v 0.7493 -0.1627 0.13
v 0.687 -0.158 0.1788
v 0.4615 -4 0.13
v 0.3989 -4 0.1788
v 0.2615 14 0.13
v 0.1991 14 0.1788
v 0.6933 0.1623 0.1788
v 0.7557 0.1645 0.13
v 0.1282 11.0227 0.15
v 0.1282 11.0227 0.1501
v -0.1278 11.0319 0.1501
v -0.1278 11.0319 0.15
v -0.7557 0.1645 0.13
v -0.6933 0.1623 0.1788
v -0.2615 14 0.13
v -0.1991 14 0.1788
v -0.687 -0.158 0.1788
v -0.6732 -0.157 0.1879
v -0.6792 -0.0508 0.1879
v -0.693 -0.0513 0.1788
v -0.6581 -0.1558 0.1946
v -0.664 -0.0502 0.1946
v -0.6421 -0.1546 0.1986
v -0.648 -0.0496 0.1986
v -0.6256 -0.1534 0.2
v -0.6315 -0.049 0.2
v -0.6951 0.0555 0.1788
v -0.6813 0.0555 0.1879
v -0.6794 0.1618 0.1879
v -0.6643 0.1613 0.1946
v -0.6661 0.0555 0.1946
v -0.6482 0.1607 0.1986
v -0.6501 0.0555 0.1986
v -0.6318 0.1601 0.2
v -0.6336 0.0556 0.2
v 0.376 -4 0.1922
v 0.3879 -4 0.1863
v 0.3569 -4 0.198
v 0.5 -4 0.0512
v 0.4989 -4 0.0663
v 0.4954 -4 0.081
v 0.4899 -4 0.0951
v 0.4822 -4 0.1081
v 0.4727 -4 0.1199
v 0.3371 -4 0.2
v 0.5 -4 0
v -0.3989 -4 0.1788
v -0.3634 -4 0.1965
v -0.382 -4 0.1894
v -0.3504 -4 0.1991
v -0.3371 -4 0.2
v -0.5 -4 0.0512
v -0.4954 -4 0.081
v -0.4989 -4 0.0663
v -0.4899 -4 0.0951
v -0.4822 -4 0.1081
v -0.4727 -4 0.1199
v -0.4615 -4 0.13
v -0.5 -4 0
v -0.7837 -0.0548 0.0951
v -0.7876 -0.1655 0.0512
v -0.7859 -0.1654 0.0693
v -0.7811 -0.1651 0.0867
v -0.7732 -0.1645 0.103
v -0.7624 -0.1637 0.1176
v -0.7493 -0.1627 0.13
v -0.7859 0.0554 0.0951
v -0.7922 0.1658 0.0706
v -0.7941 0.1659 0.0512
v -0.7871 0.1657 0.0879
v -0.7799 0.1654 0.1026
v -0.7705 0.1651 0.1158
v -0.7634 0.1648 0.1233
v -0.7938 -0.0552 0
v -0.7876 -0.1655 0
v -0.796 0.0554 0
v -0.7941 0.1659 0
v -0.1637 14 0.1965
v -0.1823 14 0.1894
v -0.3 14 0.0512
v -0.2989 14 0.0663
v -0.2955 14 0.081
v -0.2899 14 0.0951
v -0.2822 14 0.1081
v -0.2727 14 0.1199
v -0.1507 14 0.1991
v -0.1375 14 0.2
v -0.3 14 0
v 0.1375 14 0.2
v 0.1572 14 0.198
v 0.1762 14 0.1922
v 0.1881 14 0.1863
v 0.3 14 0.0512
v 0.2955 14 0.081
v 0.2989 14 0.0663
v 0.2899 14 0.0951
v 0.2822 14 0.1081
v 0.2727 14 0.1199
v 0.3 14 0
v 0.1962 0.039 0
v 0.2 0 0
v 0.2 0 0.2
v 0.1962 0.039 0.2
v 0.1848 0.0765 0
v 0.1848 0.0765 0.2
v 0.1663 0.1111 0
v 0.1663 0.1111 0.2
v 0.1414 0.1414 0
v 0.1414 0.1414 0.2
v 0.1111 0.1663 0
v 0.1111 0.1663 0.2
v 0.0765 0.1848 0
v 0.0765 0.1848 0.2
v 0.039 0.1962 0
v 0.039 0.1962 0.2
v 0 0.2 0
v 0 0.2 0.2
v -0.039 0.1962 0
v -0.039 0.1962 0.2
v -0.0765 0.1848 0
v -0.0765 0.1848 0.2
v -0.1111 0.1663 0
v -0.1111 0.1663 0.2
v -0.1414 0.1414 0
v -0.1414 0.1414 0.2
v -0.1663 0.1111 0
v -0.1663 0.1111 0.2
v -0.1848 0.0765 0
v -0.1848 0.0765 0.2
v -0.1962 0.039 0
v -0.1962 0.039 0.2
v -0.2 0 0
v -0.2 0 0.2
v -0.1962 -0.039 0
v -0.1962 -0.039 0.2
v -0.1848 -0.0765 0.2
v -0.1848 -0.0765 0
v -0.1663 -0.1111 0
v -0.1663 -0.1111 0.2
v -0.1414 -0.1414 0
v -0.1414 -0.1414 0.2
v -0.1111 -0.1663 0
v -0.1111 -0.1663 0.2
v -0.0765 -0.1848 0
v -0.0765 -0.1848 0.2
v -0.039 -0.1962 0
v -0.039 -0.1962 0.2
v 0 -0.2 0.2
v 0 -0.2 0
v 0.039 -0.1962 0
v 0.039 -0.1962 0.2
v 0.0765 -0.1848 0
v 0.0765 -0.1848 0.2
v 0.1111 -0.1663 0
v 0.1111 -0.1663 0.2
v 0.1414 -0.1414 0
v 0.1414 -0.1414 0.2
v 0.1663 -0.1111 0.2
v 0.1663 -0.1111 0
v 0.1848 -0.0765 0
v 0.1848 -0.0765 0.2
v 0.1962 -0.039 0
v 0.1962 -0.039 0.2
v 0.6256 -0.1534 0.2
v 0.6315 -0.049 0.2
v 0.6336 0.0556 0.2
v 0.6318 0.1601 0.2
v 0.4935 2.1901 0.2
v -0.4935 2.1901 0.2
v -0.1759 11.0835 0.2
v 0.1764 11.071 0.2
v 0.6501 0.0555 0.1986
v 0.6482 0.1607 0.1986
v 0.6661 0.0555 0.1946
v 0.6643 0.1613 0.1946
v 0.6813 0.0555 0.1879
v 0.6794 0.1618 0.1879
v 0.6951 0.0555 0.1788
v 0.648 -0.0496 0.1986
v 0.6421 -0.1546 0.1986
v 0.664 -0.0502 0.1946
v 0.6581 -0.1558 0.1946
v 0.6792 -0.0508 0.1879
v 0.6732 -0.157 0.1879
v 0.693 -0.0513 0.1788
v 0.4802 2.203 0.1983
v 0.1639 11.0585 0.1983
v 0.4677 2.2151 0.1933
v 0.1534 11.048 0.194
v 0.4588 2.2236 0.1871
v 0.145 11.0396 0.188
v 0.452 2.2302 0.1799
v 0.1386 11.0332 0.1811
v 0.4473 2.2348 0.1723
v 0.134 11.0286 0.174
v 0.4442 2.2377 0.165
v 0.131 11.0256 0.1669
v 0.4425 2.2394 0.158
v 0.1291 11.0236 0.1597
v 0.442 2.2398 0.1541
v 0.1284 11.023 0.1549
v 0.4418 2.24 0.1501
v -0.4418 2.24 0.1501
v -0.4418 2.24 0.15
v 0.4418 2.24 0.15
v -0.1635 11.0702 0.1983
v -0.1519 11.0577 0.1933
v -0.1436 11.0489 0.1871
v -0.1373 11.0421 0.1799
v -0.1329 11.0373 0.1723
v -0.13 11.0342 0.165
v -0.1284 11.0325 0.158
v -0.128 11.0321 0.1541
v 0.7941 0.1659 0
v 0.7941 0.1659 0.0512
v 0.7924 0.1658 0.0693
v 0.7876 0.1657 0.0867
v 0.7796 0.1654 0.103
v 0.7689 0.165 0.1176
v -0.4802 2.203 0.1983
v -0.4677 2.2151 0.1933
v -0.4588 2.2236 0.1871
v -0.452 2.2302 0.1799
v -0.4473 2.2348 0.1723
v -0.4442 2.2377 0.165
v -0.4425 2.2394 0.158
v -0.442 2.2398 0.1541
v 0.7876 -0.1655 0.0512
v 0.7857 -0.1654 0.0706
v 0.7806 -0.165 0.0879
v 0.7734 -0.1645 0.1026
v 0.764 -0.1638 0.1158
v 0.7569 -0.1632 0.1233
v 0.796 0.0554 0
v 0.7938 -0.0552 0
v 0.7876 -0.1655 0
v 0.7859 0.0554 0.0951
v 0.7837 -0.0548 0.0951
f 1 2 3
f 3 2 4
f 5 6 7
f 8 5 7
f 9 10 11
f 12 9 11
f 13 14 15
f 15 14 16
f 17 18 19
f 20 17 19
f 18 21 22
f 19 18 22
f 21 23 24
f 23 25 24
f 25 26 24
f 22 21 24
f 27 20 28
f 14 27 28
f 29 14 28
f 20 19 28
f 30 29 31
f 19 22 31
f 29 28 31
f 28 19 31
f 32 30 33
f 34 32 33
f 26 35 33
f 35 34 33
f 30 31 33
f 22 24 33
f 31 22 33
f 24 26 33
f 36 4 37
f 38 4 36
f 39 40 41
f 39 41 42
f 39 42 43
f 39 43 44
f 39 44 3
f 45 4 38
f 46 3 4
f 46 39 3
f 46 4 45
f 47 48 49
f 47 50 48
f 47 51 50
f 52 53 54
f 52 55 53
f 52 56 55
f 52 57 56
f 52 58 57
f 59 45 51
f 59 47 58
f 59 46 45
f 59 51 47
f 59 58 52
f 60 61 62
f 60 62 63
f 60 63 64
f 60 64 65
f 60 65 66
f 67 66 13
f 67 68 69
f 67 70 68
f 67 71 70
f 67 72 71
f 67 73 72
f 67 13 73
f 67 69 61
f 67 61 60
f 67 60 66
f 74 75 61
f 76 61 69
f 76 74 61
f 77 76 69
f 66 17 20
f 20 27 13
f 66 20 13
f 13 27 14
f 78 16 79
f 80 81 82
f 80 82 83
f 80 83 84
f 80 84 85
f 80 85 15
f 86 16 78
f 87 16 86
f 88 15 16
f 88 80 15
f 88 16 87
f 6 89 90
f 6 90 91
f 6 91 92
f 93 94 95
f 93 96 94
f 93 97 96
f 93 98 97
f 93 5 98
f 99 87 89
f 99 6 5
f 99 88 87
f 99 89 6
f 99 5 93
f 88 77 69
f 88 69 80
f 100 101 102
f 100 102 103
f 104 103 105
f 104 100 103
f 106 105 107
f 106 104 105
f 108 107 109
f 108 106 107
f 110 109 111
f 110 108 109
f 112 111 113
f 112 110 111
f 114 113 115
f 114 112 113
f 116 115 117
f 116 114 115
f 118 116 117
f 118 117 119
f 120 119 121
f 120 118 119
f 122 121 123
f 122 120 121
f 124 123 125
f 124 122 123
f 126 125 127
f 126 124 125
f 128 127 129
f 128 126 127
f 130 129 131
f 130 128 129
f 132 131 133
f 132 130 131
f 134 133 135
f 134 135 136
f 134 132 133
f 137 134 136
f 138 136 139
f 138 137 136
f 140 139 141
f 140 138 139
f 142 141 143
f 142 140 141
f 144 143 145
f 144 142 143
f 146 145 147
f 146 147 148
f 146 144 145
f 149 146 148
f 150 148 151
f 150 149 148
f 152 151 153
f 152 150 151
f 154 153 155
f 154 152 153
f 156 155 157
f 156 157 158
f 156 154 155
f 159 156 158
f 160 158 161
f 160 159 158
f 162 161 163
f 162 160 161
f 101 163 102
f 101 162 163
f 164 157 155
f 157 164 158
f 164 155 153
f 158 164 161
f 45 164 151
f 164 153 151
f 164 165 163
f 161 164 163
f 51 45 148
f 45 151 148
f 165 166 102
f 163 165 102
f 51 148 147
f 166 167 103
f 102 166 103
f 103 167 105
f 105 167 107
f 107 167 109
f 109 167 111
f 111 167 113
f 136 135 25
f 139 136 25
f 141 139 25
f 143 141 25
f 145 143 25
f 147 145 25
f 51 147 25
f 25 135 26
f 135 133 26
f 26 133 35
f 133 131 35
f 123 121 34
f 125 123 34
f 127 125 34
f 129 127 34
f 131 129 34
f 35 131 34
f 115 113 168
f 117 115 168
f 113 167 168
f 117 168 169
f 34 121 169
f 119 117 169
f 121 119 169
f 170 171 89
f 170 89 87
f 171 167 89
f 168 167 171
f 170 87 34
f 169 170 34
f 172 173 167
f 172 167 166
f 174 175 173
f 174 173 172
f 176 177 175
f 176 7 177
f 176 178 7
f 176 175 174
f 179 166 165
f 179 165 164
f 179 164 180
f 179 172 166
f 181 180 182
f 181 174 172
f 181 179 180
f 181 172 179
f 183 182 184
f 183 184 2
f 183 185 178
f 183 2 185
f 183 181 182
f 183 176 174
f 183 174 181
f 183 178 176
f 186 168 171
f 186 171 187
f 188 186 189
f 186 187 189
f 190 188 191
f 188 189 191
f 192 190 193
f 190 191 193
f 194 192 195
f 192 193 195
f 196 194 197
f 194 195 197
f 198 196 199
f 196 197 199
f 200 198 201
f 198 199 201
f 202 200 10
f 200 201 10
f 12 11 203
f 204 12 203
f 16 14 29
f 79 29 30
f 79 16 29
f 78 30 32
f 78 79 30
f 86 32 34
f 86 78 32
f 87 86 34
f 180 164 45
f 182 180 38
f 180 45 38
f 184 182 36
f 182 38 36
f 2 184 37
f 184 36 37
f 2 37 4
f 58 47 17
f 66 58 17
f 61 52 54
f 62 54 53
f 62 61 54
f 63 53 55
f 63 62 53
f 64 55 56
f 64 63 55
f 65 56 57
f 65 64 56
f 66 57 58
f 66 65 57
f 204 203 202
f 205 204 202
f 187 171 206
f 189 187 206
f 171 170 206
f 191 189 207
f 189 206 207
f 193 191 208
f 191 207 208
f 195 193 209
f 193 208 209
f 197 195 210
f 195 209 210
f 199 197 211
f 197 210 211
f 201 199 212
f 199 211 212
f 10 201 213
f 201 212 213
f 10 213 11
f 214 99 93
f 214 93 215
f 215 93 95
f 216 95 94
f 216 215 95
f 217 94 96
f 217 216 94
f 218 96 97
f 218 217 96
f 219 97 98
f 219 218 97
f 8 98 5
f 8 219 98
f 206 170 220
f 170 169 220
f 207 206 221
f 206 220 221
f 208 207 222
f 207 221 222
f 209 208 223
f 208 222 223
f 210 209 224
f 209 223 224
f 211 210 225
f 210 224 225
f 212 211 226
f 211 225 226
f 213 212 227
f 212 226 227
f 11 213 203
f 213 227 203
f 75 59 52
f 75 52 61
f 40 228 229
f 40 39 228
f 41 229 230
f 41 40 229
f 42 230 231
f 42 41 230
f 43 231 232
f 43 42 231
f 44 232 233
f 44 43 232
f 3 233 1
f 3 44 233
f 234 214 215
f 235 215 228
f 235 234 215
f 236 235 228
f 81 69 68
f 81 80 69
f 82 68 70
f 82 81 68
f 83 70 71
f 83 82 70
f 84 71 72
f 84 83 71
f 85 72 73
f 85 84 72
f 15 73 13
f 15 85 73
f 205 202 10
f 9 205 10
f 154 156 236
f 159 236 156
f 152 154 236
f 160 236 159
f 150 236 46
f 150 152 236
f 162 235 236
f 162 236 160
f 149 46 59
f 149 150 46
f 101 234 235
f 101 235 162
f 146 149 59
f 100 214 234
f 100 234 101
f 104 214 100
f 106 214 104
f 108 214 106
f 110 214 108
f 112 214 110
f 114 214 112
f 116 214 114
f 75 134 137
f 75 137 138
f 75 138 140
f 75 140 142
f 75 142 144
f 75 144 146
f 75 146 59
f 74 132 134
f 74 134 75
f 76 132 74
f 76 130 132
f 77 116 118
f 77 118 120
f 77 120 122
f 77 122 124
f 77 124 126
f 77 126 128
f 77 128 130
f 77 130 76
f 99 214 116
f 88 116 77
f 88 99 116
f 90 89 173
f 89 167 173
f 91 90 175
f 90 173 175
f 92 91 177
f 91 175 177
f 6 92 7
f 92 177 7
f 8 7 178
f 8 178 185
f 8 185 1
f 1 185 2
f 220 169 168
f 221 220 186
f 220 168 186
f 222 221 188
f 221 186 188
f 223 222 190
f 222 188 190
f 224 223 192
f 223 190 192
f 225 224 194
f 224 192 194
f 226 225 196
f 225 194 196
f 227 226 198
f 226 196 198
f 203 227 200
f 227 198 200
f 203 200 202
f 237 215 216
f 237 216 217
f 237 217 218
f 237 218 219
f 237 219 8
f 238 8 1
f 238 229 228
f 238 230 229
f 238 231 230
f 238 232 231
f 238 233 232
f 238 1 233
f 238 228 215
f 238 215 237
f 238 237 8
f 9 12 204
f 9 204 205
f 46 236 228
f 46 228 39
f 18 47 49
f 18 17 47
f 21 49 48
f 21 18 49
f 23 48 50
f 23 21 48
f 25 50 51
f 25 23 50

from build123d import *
from OCP.BRepFilletAPI import BRepFilletAPI_MakeChamfer

# Parameters (mm, degrees)
SKETCH_1_R          = 0.2
EXTRUDE_1_DEPTH     = 0.2
CHAMFER_1_SIZE      = 0.1
CHAMFER_1_SIZE2     = 0.127994163
CUT_EXTRUDE_1_DEPTH = 0.05
FILLET_1_R          = 0.1
FILLET_2_R          = 0.05


with BuildPart() as part:
    # Эскиз1 → Бобышка-Вытянуть1 (new body)
    with BuildSketch(Plane.XY):
        with BuildLine():
            Line((-0.794074936, 0.165901801), (-0.3, 14))
            Line((-0.3, 14), (0.3, 14))
            Line((0.3, 14), (0.794074936, 0.165901801))
            ThreePointArc((0.794074936, 0.165901801), (0.795411305, 8.986e-05), (0.787584302, -0.165542636))
            Line((0.787584302, -0.165542636), (0.5, -4))
            Line((0.5, -4), (-0.5, -4))
            Line((-0.5, -4), (-0.787584302, -0.165542636))
            ThreePointArc((-0.787584302, -0.165542636), (-0.795411305, 8.986e-05), (-0.794074936, 0.165901801))
        make_face()
        Circle(SKETCH_1_R, mode=Mode.SUBTRACT)
    extrude(amount=EXTRUDE_1_DEPTH)

    # Фаска1: one chamfer whose edges measure the first distance from different faces: ONE call of the kernel's chamfer builder (chamfer() names one face for all edges)
    chamfer_1_edges_1 = [part.edges().sort_by_distance(p)[0] for p in [
        (-0.795411305, 8.986e-05, 0.2),
    ]]
    chamfer_1_side_1 = [part.faces().sort_by_distance(p)[0] for p in [
        (-0.795411305, 8.986e-05, 0.1),
    ]]
    chamfer_1_edges_2 = [part.edges().sort_by_distance(p)[0] for p in [
        (-0.643792151, -2.082771318, 0.2),
    ]]
    chamfer_1_side_2 = [part.faces().sort_by_distance(p)[0] for p in [
        (-0.643792151, -2.082771318, 0.1),
    ]]
    chamfer_1_edges_3 = [part.edges().sort_by_distance(p)[0] for p in [
        (0.643792151, -2.082771318, 0.2),
    ]]
    chamfer_1_side_3 = [part.faces().sort_by_distance(p)[0] for p in [
        (0.643792151, -2.082771318, 0.1),
    ]]
    chamfer_1_edges_4 = [part.edges().sort_by_distance(p)[0] for p in [
        (0.795411305, 8.986e-05, 0.2),
    ]]
    chamfer_1_side_4 = [part.faces().sort_by_distance(p)[0] for p in [
        (0.795411305, 8.986e-05, 0.1),
    ]]
    chamfer_1_edges_5 = [part.edges().sort_by_distance(p)[0] for p in [
        (0.547037468, 7.0829509, 0.2),
    ]]
    chamfer_1_side_5 = [part.faces().sort_by_distance(p)[0] for p in [
        (0.547037468, 7.0829509, 0.1),
    ]]
    chamfer_1_edges_6 = [part.edges().sort_by_distance(p)[0] for p in [
        (-0.547037468, 7.0829509, 0.2),
    ]]
    chamfer_1_side_6 = [part.faces().sort_by_distance(p)[0] for p in [
        (-0.547037468, 7.0829509, 0.1),
    ]]
    chamfer_1 = BRepFilletAPI_MakeChamfer(part.part.solid().wrapped)
    for e in chamfer_1_edges_1:
        chamfer_1.Add(CHAMFER_1_SIZE, CHAMFER_1_SIZE2, e.wrapped, chamfer_1_side_1[0].wrapped)  # the first distance lies on this face
    for e in chamfer_1_edges_2:
        chamfer_1.Add(CHAMFER_1_SIZE, CHAMFER_1_SIZE2, e.wrapped, chamfer_1_side_2[0].wrapped)  # the first distance lies on this face
    for e in chamfer_1_edges_3:
        chamfer_1.Add(CHAMFER_1_SIZE, CHAMFER_1_SIZE2, e.wrapped, chamfer_1_side_3[0].wrapped)  # the first distance lies on this face
    for e in chamfer_1_edges_4:
        chamfer_1.Add(CHAMFER_1_SIZE, CHAMFER_1_SIZE2, e.wrapped, chamfer_1_side_4[0].wrapped)  # the first distance lies on this face
    for e in chamfer_1_edges_5:
        chamfer_1.Add(CHAMFER_1_SIZE, CHAMFER_1_SIZE2, e.wrapped, chamfer_1_side_5[0].wrapped)  # the first distance lies on this face
    for e in chamfer_1_edges_6:
        chamfer_1.Add(CHAMFER_1_SIZE, CHAMFER_1_SIZE2, e.wrapped, chamfer_1_side_6[0].wrapped)  # the first distance lies on this face
    add(Compound.cast(chamfer_1.Shape()), mode=Mode.REPLACE)

    # Эскиз2 → Вырез-Вытянуть1 (cut)
    with BuildSketch(Plane.XY.offset(0.2)):
        Polygon((-0.127832554, 11.03188933), (-0.441828601, 2.24), (0.441828601, 2.24), (0.128159074, 11.022746772), align=None)
    extrude(amount=-CUT_EXTRUDE_1_DEPTH, mode=Mode.SUBTRACT)

    # Скругление1
    fillet_1_edges = [part.edges().sort_by_distance(p)[0] for p in [
        (-0.419043279, 7.080666746, 0.2),
        (-0.667441677, 0.002595872, 0.2),
        (-0.515797485, -2.077984979, 0.2),
        (0.419043279, 7.080666746, 0.2),
        (0.667441677, 0.002595872, 0.2),
        (0.515797485, -2.077984979, 0.2),
        (0.643792151, -2.082771318, 0.1),
        (0.795411305, 8.986e-05, 0.1),
        (0.547037468, 7.0829509, 0.1),
        (-0.643792151, -2.082771318, 0.1),
        (-0.795411305, 8.986e-05, 0.1),
        (-0.547037468, 7.0829509, 0.1),
    ]]
    fillet(fillet_1_edges, radius=FILLET_1_R)

    # Скругление2
    fillet_2_edges = [part.edges().sort_by_distance(p)[0] for p in [
        (0.00016326, 11.027318051, 0.2),
        (0.284993837, 6.631373386, 0.2),
        (0, 2.24, 0.2),
        (-0.284830577, 6.635944665, 0.2),
    ]]
    fillet(fillet_2_edges, radius=FILLET_2_R - 0.0001)  # a hair under: the kernel refuses the full size


solid = part.part
